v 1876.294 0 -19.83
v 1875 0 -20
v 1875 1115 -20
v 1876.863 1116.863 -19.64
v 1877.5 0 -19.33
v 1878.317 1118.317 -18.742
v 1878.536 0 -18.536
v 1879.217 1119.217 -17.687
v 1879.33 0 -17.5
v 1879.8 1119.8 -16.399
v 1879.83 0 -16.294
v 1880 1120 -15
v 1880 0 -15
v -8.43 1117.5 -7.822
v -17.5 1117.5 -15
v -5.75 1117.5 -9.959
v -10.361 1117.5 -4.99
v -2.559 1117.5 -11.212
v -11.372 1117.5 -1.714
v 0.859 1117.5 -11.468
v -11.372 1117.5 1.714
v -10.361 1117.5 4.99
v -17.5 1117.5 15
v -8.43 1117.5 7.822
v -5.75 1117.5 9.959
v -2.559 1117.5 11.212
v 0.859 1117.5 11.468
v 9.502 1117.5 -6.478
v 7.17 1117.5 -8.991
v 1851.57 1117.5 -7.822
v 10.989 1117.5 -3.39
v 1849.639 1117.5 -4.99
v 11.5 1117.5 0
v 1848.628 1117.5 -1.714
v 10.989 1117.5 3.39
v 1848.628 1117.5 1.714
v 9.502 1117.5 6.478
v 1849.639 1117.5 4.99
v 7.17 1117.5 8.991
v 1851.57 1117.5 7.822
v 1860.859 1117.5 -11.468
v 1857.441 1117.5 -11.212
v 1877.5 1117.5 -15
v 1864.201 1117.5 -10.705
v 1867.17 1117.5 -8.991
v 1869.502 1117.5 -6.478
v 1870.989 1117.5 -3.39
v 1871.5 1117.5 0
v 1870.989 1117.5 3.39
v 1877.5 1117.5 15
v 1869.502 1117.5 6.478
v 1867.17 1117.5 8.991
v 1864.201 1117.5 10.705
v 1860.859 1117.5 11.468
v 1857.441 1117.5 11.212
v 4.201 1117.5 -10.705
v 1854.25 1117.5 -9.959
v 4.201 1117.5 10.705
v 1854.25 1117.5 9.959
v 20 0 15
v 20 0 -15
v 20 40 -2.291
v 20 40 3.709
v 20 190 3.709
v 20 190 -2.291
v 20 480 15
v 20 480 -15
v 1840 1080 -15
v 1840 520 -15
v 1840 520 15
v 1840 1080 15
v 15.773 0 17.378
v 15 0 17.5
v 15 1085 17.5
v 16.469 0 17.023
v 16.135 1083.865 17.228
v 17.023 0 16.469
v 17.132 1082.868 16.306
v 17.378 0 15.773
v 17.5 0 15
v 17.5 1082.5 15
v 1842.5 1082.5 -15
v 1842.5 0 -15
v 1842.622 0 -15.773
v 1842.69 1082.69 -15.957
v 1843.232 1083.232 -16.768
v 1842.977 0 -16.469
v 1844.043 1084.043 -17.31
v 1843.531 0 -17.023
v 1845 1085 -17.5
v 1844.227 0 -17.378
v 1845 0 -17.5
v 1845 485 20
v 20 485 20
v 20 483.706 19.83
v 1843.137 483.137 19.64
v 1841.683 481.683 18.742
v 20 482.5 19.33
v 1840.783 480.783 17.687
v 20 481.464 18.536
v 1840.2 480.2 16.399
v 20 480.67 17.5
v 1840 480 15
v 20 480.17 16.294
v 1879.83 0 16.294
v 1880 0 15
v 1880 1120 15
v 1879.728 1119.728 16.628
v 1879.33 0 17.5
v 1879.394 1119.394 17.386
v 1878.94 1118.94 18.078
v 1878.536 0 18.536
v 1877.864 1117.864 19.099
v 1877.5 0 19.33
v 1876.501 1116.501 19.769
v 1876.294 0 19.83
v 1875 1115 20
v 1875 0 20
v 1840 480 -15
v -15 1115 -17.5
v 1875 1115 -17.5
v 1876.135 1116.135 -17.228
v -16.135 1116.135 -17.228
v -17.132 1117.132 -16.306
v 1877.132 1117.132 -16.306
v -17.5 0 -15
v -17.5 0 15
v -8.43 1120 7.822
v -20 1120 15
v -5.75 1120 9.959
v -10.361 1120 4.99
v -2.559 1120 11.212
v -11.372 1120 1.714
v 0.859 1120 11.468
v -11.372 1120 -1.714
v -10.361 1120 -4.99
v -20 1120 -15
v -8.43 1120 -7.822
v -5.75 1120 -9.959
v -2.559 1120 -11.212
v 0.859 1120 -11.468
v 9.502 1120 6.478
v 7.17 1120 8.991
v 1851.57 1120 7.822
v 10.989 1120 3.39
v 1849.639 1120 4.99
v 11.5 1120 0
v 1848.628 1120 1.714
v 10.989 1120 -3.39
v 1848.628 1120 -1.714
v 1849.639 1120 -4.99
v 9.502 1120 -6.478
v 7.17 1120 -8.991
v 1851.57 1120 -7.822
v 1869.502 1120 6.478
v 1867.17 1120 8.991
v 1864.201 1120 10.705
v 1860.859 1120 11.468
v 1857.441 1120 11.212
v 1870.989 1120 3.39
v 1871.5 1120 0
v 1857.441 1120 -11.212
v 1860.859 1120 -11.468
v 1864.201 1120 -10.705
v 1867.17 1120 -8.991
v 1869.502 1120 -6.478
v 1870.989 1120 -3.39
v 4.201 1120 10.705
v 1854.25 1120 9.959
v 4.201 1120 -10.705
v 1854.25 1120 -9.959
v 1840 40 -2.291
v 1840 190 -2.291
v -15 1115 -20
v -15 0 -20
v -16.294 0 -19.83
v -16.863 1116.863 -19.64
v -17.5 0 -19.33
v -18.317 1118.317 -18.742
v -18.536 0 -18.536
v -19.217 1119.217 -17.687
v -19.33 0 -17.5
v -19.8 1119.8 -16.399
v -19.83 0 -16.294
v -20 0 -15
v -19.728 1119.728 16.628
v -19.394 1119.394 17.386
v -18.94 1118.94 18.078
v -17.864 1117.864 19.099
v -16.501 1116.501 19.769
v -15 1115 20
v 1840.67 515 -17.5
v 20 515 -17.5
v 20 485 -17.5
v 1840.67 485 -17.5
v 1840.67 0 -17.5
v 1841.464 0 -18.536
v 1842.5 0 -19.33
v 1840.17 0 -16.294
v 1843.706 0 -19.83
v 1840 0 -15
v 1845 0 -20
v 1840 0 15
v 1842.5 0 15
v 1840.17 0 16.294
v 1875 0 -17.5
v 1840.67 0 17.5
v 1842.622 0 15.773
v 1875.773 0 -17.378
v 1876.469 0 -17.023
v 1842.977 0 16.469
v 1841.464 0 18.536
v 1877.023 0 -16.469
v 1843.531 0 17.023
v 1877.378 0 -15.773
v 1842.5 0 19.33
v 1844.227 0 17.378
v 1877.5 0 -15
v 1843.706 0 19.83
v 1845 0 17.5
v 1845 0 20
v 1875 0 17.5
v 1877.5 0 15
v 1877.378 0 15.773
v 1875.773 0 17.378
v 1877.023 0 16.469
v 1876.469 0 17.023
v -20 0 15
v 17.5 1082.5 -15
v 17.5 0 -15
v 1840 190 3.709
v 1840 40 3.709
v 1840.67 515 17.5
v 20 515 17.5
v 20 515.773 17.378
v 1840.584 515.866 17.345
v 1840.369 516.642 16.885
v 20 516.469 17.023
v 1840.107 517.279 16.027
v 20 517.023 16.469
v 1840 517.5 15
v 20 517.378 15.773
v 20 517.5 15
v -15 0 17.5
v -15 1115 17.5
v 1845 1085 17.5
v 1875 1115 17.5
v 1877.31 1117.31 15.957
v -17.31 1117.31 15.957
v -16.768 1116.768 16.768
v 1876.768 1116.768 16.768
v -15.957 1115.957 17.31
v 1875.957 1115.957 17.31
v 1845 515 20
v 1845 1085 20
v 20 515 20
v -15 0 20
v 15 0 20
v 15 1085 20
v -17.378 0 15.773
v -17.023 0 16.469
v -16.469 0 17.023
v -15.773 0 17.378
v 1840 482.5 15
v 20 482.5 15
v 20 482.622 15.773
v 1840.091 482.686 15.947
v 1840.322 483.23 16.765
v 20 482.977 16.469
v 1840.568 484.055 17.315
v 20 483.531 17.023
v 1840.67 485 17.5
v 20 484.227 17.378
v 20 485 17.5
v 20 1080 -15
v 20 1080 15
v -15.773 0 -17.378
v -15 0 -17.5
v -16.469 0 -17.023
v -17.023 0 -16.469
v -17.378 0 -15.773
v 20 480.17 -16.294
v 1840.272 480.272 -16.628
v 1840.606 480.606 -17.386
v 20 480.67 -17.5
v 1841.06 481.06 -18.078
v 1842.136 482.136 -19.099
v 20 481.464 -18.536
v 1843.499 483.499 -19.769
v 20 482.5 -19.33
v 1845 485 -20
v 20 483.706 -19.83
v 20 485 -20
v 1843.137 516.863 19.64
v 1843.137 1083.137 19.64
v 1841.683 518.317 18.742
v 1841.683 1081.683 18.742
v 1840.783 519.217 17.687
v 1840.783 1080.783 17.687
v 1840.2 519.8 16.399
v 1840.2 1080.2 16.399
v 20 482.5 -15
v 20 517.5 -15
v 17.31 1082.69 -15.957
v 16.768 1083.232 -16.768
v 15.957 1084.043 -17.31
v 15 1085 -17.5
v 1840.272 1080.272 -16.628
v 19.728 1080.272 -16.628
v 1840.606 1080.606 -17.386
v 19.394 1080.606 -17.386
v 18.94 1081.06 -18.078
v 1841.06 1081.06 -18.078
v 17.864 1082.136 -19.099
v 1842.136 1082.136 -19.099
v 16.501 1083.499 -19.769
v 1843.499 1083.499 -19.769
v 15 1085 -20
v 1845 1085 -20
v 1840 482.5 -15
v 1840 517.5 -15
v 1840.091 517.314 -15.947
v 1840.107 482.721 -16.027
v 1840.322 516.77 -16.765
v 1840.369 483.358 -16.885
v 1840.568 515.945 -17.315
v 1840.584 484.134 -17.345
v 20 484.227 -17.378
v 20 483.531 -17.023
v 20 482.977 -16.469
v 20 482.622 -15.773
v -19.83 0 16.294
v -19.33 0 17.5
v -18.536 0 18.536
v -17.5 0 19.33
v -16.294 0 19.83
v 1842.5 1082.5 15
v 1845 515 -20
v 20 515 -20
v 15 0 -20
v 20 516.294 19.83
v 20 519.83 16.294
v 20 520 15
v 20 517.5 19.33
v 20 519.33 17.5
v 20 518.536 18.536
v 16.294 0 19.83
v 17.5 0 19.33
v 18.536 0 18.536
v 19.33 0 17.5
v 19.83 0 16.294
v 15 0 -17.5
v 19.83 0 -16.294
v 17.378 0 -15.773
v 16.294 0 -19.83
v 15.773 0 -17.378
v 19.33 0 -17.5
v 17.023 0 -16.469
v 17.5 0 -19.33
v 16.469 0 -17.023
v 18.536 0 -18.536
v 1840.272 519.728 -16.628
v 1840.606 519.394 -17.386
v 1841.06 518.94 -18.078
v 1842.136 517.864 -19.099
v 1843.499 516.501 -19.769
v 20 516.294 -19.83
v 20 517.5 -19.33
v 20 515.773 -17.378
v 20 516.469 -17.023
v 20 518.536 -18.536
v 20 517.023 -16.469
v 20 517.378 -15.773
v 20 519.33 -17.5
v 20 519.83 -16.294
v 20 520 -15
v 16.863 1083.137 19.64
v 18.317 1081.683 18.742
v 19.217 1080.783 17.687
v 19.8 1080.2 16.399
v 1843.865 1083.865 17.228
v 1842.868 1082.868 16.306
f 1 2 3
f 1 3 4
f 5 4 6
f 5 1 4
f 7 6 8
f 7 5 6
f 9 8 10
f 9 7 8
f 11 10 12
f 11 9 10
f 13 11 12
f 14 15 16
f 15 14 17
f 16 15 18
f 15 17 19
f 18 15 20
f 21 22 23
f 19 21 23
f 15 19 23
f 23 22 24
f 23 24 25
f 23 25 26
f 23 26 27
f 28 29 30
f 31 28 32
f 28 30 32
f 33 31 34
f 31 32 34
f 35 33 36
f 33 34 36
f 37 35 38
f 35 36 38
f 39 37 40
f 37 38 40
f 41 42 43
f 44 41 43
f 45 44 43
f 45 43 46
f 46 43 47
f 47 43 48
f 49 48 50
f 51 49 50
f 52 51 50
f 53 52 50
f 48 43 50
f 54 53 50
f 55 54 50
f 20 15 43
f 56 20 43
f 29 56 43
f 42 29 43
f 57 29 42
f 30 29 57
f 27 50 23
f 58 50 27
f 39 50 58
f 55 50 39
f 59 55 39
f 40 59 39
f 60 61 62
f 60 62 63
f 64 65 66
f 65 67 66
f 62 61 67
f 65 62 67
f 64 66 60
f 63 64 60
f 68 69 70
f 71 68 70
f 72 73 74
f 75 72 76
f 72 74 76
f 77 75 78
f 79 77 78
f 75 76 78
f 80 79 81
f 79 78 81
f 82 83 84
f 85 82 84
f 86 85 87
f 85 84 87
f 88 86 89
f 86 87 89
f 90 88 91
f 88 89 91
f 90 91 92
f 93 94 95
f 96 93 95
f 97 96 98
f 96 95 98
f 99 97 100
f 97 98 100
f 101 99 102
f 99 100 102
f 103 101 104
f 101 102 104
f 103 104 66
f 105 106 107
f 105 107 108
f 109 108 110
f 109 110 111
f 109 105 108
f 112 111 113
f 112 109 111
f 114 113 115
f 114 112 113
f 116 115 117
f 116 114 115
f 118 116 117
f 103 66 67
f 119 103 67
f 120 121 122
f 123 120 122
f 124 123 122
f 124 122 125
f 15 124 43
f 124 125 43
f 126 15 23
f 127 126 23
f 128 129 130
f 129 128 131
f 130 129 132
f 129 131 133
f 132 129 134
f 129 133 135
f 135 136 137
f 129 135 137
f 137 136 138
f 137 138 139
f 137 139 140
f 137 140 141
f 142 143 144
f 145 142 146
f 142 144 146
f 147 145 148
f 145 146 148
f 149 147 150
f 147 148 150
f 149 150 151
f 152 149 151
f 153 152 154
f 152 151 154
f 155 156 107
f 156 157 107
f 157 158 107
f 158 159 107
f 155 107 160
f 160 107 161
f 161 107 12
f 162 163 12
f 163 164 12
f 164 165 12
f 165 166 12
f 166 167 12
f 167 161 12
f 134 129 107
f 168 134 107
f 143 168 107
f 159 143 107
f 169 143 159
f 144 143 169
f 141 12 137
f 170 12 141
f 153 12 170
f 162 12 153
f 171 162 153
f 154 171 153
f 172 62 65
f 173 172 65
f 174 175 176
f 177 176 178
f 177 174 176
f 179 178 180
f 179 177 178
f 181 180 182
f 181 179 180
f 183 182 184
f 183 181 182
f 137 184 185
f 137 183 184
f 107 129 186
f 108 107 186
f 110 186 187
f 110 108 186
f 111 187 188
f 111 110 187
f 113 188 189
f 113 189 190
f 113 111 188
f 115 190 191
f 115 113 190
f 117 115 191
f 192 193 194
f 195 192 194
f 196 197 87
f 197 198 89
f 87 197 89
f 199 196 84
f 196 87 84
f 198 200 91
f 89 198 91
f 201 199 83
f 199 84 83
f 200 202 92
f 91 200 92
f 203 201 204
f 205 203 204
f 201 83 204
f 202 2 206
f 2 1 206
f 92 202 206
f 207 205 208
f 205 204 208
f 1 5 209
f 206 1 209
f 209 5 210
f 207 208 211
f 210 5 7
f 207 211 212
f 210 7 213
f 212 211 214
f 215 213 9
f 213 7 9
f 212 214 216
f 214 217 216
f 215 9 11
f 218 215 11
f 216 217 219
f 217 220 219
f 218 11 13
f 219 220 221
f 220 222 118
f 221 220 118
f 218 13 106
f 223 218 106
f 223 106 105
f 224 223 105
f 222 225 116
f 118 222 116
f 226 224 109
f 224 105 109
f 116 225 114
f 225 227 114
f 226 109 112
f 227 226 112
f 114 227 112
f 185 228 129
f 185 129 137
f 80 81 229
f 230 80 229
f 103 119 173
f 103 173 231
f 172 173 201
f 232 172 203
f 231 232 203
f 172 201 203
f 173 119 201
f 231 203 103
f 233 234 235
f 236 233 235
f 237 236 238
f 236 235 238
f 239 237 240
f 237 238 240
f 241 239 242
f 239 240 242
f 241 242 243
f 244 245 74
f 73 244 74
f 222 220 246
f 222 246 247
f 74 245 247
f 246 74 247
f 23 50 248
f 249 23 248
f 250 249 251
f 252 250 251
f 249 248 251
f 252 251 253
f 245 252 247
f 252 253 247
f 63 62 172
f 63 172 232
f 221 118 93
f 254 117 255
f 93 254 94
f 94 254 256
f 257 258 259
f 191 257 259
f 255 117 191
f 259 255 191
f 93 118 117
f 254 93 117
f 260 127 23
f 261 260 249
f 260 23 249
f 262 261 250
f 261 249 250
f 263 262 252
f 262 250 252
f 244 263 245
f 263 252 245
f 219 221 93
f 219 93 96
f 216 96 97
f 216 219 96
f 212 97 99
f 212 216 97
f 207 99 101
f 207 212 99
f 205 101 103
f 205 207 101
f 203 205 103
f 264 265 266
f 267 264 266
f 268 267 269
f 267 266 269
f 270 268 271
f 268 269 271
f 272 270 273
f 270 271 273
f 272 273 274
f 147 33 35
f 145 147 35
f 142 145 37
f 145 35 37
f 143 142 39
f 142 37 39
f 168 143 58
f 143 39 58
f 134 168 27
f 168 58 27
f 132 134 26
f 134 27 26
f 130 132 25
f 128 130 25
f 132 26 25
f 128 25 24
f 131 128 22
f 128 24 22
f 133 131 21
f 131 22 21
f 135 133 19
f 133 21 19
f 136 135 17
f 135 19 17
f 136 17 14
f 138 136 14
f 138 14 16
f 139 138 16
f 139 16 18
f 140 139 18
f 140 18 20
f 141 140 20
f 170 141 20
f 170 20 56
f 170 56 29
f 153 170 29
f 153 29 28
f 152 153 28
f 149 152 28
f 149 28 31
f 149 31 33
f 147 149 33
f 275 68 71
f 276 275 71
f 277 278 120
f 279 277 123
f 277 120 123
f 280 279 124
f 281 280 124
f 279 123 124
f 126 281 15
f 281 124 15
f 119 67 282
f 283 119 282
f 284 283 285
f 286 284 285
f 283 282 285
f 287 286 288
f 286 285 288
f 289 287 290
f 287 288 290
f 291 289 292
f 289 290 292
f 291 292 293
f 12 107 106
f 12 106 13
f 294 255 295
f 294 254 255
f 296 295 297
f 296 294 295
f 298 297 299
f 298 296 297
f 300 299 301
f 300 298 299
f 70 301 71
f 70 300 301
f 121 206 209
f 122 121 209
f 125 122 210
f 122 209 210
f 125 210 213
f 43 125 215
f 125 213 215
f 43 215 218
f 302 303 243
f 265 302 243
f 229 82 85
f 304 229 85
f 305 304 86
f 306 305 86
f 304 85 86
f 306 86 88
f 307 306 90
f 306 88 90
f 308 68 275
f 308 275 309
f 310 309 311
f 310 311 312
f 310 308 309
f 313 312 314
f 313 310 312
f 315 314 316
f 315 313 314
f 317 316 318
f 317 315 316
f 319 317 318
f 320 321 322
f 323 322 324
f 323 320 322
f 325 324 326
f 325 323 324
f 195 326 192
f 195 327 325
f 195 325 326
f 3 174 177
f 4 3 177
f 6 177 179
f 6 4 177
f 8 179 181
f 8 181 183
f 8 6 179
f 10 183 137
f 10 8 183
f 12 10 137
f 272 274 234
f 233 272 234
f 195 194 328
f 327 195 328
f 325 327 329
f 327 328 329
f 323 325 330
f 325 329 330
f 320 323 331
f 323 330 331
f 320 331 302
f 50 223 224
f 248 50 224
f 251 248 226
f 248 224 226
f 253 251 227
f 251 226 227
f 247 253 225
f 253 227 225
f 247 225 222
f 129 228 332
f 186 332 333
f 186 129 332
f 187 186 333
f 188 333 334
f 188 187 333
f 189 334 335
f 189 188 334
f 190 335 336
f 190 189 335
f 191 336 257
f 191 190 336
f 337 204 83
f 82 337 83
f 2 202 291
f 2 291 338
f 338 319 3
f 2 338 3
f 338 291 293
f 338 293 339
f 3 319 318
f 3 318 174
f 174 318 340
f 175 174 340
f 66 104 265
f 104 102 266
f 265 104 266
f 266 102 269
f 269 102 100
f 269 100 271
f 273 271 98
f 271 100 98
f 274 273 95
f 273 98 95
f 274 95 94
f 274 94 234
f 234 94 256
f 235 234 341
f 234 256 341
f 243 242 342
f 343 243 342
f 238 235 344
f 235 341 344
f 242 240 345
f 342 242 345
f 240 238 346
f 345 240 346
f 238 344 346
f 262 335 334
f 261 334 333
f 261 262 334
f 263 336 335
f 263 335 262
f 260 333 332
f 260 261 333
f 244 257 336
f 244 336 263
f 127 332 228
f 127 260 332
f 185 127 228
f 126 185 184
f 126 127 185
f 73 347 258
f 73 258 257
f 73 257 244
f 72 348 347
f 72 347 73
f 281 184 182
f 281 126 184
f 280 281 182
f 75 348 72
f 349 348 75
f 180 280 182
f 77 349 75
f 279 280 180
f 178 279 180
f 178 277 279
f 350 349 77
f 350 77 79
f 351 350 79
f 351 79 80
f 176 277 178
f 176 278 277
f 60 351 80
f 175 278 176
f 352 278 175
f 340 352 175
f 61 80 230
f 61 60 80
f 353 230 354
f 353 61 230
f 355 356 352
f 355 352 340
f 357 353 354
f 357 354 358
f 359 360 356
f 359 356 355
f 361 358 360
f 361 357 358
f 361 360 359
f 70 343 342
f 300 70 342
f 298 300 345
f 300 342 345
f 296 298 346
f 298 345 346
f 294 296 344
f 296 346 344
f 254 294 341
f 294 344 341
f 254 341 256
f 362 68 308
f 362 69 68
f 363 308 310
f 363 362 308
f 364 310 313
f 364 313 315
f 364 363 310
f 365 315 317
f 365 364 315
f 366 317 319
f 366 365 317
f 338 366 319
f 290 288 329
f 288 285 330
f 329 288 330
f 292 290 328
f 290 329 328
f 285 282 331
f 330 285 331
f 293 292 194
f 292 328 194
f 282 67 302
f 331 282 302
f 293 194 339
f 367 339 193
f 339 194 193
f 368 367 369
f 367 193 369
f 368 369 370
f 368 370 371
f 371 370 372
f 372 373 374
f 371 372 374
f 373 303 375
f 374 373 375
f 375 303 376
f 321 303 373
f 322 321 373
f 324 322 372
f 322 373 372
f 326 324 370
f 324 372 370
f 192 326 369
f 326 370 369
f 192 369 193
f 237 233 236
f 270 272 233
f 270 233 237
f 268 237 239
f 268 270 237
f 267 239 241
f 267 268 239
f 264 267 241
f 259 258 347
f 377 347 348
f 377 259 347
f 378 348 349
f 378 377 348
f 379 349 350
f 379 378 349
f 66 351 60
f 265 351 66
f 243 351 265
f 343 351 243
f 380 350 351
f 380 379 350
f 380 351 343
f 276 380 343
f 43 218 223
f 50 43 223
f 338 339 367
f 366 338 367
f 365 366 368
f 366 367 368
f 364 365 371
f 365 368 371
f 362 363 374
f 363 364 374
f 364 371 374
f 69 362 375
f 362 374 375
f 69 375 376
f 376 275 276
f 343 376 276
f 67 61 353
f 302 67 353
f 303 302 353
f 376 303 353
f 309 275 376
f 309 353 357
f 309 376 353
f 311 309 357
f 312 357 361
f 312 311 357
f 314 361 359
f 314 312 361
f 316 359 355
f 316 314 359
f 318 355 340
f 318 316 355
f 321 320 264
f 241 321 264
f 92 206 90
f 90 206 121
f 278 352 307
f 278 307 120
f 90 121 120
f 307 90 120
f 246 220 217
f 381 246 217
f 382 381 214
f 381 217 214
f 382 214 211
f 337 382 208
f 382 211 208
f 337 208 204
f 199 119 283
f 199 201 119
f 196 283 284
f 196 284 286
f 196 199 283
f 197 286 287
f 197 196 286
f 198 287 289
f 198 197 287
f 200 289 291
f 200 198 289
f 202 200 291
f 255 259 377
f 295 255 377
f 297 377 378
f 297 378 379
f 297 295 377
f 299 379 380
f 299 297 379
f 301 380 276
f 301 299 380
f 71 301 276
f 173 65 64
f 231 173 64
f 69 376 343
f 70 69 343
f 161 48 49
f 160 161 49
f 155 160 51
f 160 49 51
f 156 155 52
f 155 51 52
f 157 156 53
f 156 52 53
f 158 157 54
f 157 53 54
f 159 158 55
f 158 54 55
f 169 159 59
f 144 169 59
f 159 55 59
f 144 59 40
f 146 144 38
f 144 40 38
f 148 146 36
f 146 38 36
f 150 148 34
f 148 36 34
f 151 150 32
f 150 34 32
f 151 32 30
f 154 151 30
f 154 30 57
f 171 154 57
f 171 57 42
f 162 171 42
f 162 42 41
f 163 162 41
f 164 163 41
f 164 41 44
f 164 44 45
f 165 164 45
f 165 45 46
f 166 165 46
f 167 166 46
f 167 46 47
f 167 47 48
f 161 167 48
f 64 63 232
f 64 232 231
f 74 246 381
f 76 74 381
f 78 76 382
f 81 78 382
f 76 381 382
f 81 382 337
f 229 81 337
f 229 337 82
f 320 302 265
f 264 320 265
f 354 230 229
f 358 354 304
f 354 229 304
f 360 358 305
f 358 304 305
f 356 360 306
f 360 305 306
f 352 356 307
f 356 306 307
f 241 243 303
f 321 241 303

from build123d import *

# Parameters (mm, degrees)
F5_W     = 150
F5_H     = 6
F6_DEPTH = 1820
F8_D     = 23


with BuildPart() as f2:
    # F2: sweep along a path in F1
    with BuildLine(Plane.XY) as f2_path:
        Line((0, 0), (0, 1100))
        Line((0, 1100), (1860, 1100))
        Line((1860, 1100), (1860, 0))
    # F0 (on Front) → F2 (sweep)
    with BuildSketch(Plane.XZ):
        with BuildLine():
            Line((-15, -20), (15, -20))
            ThreePointArc((15, -20), (18.5355339059, -18.5355339059), (20, -15))
            Line((20, -15), (20, 15))
            ThreePointArc((20, 15), (18.5355339059, 18.5355339059), (15, 20))
            Line((15, 20), (-15, 20))
            ThreePointArc((-15, 20), (-18.5355339059, 18.5355339059), (-20, 15))
            Line((-20, 15), (-20, -15))
            ThreePointArc((-20, -15), (-18.5355339059, -18.5355339059), (-15, -20))
        make_face()
        with BuildLine():
            ThreePointArc((-15, -17.5), (-16.767766953, -16.767766953), (-17.5, -15))
            Line((-17.5, -15), (-17.5, 15))
            ThreePointArc((-17.5, 15), (-16.767766953, 16.767766953), (-15, 17.5))
            Line((-15, 17.5), (15, 17.5))
            ThreePointArc((15, 17.5), (16.767766953, 16.767766953), (17.5, 15))
            Line((17.5, 15), (17.5, -15))
            ThreePointArc((17.5, -15), (16.767766953, -16.767766953), (15, -17.5))
            Line((15, -17.5), (-15, -17.5))
        make_face(mode=Mode.SUBTRACT)
    sweep(path=f2_path.line, transition=Transition.RIGHT)

    # F3 (on face) → F4 (join, up to the next surface of F2)
    with BuildSketch(Plane.YZ.offset(20)):
        with BuildLine():
            Line((485, -20), (515, -20))
            ThreePointArc((515, -20), (518.5355339059, -18.5355339059), (520, -15))
            Line((520, -15), (520, 15))
            ThreePointArc((520, 15), (518.5355339059, 18.5355339059), (515, 20))
            Line((515, 20), (485, 20))
            ThreePointArc((485, 20), (481.4644660941, 18.5355339059), (480, 15))
            Line((480, 15), (480, -15))
            ThreePointArc((480, -15), (481.4644660941, -18.5355339059), (485, -20))
        make_face()
        with BuildLine():
            ThreePointArc((485, -17.5), (483.232233047, -16.767766953), (482.5, -15))
            Line((482.5, -15), (482.5, 15))
            ThreePointArc((482.5, 15), (483.232233047, 16.767766953), (485, 17.5))
            Line((485, 17.5), (515, 17.5))
            ThreePointArc((515, 17.5), (516.767766953, 16.767766953), (517.5, 15))
            Line((517.5, 15), (517.5, -15))
            ThreePointArc((517.5, -15), (516.767766953, -16.767766953), (515, -17.5))
            Line((515, -17.5), (485, -17.5))
        make_face(mode=Mode.SUBTRACT)
    extrude(until=Until.NEXT)

    # F5 (on face) → F6 (join, through all)
    with BuildSketch(Plane.YZ.offset(20)):
        with Locations((115, 0.7091578767)):
            Rectangle(F5_W, F5_H)
    extrude(amount=F6_DEPTH)

    # F8 (through all)
    with Locations(Plane(origin=(0, 1120, 0), x_dir=(-1, 0, 0), z_dir=(0, 1, 0))):
        with Locations((0, 0), (-1860, 0)):
            Hole(F8_D / 2)


solid = f2.part
